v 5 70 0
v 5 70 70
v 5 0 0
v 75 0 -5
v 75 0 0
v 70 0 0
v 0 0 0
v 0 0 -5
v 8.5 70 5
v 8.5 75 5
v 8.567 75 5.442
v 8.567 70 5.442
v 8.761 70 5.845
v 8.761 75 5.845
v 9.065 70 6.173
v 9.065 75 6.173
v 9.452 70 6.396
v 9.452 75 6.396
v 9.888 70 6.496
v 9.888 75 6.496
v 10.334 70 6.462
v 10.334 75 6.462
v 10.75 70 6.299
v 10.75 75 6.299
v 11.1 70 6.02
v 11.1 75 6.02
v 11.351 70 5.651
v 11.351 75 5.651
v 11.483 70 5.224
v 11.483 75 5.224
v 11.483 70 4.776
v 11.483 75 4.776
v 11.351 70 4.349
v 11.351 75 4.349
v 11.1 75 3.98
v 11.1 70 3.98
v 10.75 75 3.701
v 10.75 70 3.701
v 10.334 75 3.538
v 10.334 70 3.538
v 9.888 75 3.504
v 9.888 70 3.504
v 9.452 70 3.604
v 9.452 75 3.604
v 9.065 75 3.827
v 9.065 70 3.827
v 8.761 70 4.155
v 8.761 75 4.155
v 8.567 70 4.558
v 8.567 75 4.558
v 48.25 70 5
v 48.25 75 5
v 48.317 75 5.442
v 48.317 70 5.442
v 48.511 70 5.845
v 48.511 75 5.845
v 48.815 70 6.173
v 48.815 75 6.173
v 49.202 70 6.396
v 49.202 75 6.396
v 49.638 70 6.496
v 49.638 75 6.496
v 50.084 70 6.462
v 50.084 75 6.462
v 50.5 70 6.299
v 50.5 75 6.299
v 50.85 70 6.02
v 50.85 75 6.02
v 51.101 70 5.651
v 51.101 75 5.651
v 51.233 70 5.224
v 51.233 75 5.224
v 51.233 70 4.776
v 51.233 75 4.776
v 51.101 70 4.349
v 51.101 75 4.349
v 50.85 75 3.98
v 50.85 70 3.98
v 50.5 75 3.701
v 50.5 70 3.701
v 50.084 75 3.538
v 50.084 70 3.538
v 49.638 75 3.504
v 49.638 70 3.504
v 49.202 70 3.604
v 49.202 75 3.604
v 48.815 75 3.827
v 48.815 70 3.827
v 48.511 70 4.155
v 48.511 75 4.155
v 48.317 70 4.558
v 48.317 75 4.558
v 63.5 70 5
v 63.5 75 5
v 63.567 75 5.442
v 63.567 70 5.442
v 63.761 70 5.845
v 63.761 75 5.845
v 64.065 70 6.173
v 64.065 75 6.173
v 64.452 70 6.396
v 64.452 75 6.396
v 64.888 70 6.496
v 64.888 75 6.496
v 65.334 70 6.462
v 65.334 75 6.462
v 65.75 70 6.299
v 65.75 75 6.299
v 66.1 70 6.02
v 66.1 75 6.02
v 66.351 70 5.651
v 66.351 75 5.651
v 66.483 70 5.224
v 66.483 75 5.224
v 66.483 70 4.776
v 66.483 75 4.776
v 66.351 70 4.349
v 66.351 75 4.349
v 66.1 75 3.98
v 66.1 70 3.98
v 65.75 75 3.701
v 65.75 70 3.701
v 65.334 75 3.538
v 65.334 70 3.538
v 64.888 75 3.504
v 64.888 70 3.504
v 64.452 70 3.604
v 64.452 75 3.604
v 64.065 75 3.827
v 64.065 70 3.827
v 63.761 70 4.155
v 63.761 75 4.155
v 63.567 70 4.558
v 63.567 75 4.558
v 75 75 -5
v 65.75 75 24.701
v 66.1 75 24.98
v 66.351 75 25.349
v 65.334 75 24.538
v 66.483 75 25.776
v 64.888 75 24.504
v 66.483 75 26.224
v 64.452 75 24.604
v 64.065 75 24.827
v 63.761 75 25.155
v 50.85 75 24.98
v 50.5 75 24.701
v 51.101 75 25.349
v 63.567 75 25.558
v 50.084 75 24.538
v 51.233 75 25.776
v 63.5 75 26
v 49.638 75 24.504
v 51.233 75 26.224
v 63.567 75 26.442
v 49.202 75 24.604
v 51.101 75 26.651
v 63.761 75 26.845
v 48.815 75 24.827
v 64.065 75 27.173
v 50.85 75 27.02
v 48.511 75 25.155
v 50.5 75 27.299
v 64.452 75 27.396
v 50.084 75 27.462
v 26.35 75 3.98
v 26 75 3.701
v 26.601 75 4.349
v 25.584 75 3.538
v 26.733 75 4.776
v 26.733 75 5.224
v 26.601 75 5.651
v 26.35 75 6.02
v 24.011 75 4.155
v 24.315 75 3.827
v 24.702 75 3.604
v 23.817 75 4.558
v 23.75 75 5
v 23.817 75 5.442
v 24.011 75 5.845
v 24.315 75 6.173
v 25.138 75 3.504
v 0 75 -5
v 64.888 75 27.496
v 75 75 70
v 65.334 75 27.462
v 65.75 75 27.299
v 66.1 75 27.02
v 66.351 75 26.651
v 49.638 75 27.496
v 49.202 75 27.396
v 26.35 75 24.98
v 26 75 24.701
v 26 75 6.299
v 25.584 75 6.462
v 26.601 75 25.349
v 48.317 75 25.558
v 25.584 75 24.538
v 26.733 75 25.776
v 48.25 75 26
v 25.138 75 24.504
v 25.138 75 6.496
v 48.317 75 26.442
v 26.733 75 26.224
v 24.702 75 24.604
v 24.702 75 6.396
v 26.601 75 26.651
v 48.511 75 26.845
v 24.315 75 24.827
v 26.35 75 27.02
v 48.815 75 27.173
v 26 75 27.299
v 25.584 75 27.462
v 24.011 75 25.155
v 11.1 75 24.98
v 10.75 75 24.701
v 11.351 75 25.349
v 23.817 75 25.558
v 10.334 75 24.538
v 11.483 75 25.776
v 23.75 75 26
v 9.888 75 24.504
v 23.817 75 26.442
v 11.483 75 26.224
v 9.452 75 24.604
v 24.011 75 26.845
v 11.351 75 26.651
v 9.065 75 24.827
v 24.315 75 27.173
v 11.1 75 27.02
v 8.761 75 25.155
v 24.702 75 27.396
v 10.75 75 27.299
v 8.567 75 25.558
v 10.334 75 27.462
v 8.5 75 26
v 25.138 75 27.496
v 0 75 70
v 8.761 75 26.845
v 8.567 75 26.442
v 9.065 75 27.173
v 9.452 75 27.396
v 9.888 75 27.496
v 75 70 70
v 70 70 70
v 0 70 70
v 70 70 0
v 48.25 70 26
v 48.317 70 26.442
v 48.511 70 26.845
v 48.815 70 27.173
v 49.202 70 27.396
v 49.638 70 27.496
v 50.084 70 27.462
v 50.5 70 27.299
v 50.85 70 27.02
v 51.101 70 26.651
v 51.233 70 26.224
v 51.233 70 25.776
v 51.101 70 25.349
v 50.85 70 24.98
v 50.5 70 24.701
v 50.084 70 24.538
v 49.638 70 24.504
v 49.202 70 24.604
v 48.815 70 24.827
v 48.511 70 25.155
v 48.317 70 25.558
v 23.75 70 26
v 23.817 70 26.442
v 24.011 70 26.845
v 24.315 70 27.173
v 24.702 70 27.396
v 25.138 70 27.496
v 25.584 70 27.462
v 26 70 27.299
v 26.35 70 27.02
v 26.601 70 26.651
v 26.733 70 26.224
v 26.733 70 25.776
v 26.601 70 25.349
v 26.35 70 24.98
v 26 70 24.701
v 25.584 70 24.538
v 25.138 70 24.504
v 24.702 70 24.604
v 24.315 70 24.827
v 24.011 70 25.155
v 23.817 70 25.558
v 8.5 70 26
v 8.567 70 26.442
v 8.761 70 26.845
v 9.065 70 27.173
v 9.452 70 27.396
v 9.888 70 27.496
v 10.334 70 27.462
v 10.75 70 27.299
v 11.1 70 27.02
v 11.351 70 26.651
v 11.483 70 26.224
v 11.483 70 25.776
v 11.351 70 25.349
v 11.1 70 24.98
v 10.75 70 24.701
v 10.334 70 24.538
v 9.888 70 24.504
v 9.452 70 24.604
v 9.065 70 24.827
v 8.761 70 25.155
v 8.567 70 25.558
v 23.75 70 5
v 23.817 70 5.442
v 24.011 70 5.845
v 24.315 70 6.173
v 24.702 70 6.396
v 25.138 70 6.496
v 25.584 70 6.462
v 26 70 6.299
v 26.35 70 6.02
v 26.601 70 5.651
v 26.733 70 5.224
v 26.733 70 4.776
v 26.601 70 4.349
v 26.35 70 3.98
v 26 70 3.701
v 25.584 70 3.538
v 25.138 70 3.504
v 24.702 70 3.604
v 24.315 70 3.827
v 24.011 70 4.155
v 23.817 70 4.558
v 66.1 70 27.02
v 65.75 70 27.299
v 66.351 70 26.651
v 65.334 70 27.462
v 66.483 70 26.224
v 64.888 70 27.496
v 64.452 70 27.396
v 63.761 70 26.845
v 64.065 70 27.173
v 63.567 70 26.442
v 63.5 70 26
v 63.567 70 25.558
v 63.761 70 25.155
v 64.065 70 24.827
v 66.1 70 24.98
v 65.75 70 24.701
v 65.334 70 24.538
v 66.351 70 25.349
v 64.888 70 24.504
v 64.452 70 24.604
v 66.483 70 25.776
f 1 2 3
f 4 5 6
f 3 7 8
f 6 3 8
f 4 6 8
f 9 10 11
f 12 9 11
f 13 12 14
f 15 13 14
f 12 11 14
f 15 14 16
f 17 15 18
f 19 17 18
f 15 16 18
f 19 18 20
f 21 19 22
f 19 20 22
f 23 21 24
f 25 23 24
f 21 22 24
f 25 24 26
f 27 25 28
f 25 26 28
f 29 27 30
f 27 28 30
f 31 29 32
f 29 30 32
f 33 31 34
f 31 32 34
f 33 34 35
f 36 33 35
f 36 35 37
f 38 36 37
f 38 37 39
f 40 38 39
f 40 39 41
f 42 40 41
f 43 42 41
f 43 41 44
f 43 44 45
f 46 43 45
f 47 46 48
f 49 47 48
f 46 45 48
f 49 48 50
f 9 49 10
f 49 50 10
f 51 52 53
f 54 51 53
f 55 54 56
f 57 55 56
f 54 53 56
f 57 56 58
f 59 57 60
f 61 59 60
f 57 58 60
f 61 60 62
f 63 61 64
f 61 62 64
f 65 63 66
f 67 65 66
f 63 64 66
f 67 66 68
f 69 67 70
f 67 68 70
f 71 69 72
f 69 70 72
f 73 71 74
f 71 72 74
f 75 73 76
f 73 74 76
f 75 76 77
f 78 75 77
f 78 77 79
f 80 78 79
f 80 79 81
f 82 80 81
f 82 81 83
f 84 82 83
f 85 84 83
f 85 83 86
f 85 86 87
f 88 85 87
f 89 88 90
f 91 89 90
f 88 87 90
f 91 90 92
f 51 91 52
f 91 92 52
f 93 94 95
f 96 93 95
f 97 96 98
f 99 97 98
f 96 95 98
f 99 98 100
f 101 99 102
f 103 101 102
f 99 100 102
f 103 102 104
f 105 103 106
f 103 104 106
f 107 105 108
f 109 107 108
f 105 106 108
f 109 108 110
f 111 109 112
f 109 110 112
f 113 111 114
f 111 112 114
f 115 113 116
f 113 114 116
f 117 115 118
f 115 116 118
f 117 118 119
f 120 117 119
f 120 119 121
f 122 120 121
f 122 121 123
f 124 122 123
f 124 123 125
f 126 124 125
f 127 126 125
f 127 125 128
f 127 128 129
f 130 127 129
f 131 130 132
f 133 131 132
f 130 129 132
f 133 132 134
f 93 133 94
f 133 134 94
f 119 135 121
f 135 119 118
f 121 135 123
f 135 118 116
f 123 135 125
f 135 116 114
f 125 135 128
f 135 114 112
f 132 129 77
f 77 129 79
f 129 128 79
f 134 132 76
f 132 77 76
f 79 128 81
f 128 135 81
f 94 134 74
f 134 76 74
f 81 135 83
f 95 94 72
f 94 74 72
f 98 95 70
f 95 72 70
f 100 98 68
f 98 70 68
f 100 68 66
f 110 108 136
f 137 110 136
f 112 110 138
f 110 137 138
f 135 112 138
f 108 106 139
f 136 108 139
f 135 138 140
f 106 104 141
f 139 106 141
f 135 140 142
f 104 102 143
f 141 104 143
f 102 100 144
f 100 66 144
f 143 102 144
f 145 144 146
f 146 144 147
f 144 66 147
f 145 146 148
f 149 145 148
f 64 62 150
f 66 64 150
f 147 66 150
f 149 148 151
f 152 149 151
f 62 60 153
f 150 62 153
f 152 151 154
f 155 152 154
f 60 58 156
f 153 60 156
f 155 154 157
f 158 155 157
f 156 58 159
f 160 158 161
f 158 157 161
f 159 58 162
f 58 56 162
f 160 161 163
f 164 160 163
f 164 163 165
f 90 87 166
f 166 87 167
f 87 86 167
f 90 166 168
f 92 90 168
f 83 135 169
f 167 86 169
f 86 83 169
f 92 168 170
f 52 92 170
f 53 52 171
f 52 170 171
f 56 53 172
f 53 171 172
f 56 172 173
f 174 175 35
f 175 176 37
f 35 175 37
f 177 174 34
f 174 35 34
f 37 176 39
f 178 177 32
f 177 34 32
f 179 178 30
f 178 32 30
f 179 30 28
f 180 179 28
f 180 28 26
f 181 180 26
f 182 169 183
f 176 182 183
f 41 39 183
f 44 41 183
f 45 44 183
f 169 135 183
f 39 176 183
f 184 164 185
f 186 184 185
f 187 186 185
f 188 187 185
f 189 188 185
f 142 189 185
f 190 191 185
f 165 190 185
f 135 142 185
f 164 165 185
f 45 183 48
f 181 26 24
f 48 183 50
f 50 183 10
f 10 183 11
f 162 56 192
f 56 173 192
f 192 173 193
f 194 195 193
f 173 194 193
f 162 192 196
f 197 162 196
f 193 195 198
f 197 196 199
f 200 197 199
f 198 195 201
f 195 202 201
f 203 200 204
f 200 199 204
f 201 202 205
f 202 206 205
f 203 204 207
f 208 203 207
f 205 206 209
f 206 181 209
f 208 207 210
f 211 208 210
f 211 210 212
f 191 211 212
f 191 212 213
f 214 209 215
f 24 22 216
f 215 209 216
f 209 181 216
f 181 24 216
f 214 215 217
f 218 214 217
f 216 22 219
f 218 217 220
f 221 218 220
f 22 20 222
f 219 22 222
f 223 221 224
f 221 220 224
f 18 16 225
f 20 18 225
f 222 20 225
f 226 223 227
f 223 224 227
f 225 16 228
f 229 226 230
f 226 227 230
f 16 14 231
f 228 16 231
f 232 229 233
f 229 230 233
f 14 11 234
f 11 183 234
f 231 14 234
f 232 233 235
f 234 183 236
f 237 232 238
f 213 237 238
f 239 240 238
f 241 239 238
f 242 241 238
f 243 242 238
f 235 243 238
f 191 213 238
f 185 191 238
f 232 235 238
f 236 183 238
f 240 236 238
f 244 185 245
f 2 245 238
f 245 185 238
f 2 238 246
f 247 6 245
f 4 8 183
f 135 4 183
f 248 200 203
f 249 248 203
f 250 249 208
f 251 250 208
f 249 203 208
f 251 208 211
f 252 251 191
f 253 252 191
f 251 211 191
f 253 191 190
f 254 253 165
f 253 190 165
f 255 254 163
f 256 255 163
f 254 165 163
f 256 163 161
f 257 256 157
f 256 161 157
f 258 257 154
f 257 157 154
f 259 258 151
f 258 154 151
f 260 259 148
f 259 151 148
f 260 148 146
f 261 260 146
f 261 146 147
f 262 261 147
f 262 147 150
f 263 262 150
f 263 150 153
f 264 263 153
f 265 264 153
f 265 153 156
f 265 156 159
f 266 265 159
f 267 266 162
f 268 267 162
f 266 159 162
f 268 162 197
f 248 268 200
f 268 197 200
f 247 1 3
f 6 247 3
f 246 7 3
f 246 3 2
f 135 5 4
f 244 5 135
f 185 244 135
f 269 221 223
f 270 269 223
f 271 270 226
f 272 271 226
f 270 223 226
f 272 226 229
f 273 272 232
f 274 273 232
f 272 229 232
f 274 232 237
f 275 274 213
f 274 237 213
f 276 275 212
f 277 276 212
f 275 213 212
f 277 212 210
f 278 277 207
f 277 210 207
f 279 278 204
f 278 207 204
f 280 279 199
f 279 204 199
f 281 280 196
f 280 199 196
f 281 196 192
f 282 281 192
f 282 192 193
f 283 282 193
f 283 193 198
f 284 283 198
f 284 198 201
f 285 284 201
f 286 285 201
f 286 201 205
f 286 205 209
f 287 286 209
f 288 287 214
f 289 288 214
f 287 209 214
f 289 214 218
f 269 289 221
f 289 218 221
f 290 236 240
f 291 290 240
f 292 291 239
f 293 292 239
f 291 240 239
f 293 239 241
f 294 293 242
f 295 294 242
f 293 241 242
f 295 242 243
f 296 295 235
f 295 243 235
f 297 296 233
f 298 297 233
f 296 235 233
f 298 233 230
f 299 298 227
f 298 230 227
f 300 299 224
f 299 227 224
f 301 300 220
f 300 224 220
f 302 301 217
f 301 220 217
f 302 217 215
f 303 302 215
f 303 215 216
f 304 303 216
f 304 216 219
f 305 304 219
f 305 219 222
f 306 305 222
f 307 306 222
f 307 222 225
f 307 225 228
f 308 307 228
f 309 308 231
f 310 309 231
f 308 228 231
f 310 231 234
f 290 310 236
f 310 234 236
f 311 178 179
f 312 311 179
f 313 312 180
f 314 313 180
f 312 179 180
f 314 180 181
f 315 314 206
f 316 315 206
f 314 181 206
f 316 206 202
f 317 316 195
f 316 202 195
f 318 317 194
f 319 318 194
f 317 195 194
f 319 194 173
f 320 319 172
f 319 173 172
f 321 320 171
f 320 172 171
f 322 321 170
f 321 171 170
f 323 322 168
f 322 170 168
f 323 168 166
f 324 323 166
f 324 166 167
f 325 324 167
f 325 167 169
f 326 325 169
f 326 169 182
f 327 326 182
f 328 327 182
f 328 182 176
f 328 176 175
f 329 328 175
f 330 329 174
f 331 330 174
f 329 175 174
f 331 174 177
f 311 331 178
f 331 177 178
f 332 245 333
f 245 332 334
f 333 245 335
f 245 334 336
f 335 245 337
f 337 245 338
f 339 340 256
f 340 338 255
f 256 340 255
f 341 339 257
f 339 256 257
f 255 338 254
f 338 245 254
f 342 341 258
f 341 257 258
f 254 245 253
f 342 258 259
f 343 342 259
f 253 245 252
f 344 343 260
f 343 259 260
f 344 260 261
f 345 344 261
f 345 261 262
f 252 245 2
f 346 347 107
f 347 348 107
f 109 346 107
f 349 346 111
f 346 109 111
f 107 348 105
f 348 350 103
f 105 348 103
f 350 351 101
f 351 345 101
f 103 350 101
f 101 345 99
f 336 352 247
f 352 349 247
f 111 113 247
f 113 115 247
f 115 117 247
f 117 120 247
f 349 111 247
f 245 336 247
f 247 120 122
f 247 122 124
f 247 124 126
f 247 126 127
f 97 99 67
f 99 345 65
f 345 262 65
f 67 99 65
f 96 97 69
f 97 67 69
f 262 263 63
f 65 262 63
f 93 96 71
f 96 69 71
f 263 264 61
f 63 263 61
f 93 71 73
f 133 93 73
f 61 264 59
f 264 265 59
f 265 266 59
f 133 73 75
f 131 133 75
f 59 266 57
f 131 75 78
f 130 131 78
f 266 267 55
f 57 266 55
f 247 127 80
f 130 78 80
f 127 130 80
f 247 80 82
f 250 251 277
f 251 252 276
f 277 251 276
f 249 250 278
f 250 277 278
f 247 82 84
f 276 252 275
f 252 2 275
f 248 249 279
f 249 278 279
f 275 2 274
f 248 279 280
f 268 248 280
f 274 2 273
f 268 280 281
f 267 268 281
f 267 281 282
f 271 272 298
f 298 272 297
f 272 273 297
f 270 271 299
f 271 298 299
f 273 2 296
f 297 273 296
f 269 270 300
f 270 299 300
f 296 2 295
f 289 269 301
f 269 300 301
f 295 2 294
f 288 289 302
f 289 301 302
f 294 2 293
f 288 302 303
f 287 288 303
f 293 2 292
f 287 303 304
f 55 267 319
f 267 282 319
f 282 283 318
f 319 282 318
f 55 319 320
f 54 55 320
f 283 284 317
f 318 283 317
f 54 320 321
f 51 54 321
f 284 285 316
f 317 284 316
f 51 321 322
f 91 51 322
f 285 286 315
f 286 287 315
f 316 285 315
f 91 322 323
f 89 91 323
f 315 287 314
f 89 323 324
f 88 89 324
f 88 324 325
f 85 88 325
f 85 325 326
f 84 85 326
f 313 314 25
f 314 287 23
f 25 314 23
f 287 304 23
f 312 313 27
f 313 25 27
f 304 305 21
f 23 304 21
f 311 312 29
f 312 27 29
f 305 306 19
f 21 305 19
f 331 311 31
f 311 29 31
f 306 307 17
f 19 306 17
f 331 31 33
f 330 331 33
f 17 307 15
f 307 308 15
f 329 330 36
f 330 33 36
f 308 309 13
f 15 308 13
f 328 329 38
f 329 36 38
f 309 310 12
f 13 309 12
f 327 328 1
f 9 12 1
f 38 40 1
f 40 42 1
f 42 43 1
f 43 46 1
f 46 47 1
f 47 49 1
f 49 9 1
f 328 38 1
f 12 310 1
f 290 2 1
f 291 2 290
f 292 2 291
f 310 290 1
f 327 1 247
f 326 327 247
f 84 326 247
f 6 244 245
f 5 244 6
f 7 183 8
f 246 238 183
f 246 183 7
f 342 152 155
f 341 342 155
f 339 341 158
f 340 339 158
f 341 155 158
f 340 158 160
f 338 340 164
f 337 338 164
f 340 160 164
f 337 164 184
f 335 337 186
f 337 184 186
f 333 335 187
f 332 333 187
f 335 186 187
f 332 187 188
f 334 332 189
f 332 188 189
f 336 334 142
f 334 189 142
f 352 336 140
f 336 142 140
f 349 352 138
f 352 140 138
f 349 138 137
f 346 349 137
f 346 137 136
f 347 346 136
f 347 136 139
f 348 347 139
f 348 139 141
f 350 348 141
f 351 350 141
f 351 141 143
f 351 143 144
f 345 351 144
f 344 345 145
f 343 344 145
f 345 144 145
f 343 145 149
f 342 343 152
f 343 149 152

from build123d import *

# Parameters (mm, degrees)
F1_DEPTH = 75
F3_DEPTH = 5
F5_DEPTH = 5
F6_R     = 1.5
F7_DEPTH = 5


with BuildPart() as f1:
    # F0 (on Right) → F1 (new body)
    with BuildSketch(Plane.YZ):
        Polygon((70, 0), (0, 0), (0, -5), (75, -5), (75, 70), (70, 70), align=None)
    extrude(amount=F1_DEPTH)

    # F2 (on face) → F3 (join)
    with BuildSketch(Plane.YZ.offset(75)):
        Polygon((70, 0), (70, 70), (0, 0), align=None)
    extrude(amount=-F3_DEPTH)

    # F4 (on face) → F5 (join)
    with BuildSketch(Plane(origin=(0, 0, 0), x_dir=(0, -1, 0), z_dir=(-1, 0, 0))):
        Polygon((-70, 70), (-70, 0), (0, 0), align=None)
    extrude(amount=-F5_DEPTH)

    # F6 (on face) → F7 (cut, through all)
    with BuildSketch(Plane(origin=(0, 75, 0), x_dir=(-1, 0, 0), z_dir=(0, 1, 0))):
        with Locations((-65, 26)):
            Circle(F6_R)
        with Locations((-49.75, 26)):
            Circle(F6_R)
        with Locations((-49.75, 5)):
            Circle(F6_R)
        with Locations((-65, 5)):
            Circle(F6_R)
        with Locations((-10, 5)):
            Circle(F6_R)
        with Locations((-25.25, 5)):
            Circle(F6_R)
        with Locations((-25.25, 26)):
            Circle(F6_R)
        with Locations((-10, 26)):
            Circle(F6_R)
    extrude(amount=-F7_DEPTH, mode=Mode.SUBTRACT)


solid = f1.part
